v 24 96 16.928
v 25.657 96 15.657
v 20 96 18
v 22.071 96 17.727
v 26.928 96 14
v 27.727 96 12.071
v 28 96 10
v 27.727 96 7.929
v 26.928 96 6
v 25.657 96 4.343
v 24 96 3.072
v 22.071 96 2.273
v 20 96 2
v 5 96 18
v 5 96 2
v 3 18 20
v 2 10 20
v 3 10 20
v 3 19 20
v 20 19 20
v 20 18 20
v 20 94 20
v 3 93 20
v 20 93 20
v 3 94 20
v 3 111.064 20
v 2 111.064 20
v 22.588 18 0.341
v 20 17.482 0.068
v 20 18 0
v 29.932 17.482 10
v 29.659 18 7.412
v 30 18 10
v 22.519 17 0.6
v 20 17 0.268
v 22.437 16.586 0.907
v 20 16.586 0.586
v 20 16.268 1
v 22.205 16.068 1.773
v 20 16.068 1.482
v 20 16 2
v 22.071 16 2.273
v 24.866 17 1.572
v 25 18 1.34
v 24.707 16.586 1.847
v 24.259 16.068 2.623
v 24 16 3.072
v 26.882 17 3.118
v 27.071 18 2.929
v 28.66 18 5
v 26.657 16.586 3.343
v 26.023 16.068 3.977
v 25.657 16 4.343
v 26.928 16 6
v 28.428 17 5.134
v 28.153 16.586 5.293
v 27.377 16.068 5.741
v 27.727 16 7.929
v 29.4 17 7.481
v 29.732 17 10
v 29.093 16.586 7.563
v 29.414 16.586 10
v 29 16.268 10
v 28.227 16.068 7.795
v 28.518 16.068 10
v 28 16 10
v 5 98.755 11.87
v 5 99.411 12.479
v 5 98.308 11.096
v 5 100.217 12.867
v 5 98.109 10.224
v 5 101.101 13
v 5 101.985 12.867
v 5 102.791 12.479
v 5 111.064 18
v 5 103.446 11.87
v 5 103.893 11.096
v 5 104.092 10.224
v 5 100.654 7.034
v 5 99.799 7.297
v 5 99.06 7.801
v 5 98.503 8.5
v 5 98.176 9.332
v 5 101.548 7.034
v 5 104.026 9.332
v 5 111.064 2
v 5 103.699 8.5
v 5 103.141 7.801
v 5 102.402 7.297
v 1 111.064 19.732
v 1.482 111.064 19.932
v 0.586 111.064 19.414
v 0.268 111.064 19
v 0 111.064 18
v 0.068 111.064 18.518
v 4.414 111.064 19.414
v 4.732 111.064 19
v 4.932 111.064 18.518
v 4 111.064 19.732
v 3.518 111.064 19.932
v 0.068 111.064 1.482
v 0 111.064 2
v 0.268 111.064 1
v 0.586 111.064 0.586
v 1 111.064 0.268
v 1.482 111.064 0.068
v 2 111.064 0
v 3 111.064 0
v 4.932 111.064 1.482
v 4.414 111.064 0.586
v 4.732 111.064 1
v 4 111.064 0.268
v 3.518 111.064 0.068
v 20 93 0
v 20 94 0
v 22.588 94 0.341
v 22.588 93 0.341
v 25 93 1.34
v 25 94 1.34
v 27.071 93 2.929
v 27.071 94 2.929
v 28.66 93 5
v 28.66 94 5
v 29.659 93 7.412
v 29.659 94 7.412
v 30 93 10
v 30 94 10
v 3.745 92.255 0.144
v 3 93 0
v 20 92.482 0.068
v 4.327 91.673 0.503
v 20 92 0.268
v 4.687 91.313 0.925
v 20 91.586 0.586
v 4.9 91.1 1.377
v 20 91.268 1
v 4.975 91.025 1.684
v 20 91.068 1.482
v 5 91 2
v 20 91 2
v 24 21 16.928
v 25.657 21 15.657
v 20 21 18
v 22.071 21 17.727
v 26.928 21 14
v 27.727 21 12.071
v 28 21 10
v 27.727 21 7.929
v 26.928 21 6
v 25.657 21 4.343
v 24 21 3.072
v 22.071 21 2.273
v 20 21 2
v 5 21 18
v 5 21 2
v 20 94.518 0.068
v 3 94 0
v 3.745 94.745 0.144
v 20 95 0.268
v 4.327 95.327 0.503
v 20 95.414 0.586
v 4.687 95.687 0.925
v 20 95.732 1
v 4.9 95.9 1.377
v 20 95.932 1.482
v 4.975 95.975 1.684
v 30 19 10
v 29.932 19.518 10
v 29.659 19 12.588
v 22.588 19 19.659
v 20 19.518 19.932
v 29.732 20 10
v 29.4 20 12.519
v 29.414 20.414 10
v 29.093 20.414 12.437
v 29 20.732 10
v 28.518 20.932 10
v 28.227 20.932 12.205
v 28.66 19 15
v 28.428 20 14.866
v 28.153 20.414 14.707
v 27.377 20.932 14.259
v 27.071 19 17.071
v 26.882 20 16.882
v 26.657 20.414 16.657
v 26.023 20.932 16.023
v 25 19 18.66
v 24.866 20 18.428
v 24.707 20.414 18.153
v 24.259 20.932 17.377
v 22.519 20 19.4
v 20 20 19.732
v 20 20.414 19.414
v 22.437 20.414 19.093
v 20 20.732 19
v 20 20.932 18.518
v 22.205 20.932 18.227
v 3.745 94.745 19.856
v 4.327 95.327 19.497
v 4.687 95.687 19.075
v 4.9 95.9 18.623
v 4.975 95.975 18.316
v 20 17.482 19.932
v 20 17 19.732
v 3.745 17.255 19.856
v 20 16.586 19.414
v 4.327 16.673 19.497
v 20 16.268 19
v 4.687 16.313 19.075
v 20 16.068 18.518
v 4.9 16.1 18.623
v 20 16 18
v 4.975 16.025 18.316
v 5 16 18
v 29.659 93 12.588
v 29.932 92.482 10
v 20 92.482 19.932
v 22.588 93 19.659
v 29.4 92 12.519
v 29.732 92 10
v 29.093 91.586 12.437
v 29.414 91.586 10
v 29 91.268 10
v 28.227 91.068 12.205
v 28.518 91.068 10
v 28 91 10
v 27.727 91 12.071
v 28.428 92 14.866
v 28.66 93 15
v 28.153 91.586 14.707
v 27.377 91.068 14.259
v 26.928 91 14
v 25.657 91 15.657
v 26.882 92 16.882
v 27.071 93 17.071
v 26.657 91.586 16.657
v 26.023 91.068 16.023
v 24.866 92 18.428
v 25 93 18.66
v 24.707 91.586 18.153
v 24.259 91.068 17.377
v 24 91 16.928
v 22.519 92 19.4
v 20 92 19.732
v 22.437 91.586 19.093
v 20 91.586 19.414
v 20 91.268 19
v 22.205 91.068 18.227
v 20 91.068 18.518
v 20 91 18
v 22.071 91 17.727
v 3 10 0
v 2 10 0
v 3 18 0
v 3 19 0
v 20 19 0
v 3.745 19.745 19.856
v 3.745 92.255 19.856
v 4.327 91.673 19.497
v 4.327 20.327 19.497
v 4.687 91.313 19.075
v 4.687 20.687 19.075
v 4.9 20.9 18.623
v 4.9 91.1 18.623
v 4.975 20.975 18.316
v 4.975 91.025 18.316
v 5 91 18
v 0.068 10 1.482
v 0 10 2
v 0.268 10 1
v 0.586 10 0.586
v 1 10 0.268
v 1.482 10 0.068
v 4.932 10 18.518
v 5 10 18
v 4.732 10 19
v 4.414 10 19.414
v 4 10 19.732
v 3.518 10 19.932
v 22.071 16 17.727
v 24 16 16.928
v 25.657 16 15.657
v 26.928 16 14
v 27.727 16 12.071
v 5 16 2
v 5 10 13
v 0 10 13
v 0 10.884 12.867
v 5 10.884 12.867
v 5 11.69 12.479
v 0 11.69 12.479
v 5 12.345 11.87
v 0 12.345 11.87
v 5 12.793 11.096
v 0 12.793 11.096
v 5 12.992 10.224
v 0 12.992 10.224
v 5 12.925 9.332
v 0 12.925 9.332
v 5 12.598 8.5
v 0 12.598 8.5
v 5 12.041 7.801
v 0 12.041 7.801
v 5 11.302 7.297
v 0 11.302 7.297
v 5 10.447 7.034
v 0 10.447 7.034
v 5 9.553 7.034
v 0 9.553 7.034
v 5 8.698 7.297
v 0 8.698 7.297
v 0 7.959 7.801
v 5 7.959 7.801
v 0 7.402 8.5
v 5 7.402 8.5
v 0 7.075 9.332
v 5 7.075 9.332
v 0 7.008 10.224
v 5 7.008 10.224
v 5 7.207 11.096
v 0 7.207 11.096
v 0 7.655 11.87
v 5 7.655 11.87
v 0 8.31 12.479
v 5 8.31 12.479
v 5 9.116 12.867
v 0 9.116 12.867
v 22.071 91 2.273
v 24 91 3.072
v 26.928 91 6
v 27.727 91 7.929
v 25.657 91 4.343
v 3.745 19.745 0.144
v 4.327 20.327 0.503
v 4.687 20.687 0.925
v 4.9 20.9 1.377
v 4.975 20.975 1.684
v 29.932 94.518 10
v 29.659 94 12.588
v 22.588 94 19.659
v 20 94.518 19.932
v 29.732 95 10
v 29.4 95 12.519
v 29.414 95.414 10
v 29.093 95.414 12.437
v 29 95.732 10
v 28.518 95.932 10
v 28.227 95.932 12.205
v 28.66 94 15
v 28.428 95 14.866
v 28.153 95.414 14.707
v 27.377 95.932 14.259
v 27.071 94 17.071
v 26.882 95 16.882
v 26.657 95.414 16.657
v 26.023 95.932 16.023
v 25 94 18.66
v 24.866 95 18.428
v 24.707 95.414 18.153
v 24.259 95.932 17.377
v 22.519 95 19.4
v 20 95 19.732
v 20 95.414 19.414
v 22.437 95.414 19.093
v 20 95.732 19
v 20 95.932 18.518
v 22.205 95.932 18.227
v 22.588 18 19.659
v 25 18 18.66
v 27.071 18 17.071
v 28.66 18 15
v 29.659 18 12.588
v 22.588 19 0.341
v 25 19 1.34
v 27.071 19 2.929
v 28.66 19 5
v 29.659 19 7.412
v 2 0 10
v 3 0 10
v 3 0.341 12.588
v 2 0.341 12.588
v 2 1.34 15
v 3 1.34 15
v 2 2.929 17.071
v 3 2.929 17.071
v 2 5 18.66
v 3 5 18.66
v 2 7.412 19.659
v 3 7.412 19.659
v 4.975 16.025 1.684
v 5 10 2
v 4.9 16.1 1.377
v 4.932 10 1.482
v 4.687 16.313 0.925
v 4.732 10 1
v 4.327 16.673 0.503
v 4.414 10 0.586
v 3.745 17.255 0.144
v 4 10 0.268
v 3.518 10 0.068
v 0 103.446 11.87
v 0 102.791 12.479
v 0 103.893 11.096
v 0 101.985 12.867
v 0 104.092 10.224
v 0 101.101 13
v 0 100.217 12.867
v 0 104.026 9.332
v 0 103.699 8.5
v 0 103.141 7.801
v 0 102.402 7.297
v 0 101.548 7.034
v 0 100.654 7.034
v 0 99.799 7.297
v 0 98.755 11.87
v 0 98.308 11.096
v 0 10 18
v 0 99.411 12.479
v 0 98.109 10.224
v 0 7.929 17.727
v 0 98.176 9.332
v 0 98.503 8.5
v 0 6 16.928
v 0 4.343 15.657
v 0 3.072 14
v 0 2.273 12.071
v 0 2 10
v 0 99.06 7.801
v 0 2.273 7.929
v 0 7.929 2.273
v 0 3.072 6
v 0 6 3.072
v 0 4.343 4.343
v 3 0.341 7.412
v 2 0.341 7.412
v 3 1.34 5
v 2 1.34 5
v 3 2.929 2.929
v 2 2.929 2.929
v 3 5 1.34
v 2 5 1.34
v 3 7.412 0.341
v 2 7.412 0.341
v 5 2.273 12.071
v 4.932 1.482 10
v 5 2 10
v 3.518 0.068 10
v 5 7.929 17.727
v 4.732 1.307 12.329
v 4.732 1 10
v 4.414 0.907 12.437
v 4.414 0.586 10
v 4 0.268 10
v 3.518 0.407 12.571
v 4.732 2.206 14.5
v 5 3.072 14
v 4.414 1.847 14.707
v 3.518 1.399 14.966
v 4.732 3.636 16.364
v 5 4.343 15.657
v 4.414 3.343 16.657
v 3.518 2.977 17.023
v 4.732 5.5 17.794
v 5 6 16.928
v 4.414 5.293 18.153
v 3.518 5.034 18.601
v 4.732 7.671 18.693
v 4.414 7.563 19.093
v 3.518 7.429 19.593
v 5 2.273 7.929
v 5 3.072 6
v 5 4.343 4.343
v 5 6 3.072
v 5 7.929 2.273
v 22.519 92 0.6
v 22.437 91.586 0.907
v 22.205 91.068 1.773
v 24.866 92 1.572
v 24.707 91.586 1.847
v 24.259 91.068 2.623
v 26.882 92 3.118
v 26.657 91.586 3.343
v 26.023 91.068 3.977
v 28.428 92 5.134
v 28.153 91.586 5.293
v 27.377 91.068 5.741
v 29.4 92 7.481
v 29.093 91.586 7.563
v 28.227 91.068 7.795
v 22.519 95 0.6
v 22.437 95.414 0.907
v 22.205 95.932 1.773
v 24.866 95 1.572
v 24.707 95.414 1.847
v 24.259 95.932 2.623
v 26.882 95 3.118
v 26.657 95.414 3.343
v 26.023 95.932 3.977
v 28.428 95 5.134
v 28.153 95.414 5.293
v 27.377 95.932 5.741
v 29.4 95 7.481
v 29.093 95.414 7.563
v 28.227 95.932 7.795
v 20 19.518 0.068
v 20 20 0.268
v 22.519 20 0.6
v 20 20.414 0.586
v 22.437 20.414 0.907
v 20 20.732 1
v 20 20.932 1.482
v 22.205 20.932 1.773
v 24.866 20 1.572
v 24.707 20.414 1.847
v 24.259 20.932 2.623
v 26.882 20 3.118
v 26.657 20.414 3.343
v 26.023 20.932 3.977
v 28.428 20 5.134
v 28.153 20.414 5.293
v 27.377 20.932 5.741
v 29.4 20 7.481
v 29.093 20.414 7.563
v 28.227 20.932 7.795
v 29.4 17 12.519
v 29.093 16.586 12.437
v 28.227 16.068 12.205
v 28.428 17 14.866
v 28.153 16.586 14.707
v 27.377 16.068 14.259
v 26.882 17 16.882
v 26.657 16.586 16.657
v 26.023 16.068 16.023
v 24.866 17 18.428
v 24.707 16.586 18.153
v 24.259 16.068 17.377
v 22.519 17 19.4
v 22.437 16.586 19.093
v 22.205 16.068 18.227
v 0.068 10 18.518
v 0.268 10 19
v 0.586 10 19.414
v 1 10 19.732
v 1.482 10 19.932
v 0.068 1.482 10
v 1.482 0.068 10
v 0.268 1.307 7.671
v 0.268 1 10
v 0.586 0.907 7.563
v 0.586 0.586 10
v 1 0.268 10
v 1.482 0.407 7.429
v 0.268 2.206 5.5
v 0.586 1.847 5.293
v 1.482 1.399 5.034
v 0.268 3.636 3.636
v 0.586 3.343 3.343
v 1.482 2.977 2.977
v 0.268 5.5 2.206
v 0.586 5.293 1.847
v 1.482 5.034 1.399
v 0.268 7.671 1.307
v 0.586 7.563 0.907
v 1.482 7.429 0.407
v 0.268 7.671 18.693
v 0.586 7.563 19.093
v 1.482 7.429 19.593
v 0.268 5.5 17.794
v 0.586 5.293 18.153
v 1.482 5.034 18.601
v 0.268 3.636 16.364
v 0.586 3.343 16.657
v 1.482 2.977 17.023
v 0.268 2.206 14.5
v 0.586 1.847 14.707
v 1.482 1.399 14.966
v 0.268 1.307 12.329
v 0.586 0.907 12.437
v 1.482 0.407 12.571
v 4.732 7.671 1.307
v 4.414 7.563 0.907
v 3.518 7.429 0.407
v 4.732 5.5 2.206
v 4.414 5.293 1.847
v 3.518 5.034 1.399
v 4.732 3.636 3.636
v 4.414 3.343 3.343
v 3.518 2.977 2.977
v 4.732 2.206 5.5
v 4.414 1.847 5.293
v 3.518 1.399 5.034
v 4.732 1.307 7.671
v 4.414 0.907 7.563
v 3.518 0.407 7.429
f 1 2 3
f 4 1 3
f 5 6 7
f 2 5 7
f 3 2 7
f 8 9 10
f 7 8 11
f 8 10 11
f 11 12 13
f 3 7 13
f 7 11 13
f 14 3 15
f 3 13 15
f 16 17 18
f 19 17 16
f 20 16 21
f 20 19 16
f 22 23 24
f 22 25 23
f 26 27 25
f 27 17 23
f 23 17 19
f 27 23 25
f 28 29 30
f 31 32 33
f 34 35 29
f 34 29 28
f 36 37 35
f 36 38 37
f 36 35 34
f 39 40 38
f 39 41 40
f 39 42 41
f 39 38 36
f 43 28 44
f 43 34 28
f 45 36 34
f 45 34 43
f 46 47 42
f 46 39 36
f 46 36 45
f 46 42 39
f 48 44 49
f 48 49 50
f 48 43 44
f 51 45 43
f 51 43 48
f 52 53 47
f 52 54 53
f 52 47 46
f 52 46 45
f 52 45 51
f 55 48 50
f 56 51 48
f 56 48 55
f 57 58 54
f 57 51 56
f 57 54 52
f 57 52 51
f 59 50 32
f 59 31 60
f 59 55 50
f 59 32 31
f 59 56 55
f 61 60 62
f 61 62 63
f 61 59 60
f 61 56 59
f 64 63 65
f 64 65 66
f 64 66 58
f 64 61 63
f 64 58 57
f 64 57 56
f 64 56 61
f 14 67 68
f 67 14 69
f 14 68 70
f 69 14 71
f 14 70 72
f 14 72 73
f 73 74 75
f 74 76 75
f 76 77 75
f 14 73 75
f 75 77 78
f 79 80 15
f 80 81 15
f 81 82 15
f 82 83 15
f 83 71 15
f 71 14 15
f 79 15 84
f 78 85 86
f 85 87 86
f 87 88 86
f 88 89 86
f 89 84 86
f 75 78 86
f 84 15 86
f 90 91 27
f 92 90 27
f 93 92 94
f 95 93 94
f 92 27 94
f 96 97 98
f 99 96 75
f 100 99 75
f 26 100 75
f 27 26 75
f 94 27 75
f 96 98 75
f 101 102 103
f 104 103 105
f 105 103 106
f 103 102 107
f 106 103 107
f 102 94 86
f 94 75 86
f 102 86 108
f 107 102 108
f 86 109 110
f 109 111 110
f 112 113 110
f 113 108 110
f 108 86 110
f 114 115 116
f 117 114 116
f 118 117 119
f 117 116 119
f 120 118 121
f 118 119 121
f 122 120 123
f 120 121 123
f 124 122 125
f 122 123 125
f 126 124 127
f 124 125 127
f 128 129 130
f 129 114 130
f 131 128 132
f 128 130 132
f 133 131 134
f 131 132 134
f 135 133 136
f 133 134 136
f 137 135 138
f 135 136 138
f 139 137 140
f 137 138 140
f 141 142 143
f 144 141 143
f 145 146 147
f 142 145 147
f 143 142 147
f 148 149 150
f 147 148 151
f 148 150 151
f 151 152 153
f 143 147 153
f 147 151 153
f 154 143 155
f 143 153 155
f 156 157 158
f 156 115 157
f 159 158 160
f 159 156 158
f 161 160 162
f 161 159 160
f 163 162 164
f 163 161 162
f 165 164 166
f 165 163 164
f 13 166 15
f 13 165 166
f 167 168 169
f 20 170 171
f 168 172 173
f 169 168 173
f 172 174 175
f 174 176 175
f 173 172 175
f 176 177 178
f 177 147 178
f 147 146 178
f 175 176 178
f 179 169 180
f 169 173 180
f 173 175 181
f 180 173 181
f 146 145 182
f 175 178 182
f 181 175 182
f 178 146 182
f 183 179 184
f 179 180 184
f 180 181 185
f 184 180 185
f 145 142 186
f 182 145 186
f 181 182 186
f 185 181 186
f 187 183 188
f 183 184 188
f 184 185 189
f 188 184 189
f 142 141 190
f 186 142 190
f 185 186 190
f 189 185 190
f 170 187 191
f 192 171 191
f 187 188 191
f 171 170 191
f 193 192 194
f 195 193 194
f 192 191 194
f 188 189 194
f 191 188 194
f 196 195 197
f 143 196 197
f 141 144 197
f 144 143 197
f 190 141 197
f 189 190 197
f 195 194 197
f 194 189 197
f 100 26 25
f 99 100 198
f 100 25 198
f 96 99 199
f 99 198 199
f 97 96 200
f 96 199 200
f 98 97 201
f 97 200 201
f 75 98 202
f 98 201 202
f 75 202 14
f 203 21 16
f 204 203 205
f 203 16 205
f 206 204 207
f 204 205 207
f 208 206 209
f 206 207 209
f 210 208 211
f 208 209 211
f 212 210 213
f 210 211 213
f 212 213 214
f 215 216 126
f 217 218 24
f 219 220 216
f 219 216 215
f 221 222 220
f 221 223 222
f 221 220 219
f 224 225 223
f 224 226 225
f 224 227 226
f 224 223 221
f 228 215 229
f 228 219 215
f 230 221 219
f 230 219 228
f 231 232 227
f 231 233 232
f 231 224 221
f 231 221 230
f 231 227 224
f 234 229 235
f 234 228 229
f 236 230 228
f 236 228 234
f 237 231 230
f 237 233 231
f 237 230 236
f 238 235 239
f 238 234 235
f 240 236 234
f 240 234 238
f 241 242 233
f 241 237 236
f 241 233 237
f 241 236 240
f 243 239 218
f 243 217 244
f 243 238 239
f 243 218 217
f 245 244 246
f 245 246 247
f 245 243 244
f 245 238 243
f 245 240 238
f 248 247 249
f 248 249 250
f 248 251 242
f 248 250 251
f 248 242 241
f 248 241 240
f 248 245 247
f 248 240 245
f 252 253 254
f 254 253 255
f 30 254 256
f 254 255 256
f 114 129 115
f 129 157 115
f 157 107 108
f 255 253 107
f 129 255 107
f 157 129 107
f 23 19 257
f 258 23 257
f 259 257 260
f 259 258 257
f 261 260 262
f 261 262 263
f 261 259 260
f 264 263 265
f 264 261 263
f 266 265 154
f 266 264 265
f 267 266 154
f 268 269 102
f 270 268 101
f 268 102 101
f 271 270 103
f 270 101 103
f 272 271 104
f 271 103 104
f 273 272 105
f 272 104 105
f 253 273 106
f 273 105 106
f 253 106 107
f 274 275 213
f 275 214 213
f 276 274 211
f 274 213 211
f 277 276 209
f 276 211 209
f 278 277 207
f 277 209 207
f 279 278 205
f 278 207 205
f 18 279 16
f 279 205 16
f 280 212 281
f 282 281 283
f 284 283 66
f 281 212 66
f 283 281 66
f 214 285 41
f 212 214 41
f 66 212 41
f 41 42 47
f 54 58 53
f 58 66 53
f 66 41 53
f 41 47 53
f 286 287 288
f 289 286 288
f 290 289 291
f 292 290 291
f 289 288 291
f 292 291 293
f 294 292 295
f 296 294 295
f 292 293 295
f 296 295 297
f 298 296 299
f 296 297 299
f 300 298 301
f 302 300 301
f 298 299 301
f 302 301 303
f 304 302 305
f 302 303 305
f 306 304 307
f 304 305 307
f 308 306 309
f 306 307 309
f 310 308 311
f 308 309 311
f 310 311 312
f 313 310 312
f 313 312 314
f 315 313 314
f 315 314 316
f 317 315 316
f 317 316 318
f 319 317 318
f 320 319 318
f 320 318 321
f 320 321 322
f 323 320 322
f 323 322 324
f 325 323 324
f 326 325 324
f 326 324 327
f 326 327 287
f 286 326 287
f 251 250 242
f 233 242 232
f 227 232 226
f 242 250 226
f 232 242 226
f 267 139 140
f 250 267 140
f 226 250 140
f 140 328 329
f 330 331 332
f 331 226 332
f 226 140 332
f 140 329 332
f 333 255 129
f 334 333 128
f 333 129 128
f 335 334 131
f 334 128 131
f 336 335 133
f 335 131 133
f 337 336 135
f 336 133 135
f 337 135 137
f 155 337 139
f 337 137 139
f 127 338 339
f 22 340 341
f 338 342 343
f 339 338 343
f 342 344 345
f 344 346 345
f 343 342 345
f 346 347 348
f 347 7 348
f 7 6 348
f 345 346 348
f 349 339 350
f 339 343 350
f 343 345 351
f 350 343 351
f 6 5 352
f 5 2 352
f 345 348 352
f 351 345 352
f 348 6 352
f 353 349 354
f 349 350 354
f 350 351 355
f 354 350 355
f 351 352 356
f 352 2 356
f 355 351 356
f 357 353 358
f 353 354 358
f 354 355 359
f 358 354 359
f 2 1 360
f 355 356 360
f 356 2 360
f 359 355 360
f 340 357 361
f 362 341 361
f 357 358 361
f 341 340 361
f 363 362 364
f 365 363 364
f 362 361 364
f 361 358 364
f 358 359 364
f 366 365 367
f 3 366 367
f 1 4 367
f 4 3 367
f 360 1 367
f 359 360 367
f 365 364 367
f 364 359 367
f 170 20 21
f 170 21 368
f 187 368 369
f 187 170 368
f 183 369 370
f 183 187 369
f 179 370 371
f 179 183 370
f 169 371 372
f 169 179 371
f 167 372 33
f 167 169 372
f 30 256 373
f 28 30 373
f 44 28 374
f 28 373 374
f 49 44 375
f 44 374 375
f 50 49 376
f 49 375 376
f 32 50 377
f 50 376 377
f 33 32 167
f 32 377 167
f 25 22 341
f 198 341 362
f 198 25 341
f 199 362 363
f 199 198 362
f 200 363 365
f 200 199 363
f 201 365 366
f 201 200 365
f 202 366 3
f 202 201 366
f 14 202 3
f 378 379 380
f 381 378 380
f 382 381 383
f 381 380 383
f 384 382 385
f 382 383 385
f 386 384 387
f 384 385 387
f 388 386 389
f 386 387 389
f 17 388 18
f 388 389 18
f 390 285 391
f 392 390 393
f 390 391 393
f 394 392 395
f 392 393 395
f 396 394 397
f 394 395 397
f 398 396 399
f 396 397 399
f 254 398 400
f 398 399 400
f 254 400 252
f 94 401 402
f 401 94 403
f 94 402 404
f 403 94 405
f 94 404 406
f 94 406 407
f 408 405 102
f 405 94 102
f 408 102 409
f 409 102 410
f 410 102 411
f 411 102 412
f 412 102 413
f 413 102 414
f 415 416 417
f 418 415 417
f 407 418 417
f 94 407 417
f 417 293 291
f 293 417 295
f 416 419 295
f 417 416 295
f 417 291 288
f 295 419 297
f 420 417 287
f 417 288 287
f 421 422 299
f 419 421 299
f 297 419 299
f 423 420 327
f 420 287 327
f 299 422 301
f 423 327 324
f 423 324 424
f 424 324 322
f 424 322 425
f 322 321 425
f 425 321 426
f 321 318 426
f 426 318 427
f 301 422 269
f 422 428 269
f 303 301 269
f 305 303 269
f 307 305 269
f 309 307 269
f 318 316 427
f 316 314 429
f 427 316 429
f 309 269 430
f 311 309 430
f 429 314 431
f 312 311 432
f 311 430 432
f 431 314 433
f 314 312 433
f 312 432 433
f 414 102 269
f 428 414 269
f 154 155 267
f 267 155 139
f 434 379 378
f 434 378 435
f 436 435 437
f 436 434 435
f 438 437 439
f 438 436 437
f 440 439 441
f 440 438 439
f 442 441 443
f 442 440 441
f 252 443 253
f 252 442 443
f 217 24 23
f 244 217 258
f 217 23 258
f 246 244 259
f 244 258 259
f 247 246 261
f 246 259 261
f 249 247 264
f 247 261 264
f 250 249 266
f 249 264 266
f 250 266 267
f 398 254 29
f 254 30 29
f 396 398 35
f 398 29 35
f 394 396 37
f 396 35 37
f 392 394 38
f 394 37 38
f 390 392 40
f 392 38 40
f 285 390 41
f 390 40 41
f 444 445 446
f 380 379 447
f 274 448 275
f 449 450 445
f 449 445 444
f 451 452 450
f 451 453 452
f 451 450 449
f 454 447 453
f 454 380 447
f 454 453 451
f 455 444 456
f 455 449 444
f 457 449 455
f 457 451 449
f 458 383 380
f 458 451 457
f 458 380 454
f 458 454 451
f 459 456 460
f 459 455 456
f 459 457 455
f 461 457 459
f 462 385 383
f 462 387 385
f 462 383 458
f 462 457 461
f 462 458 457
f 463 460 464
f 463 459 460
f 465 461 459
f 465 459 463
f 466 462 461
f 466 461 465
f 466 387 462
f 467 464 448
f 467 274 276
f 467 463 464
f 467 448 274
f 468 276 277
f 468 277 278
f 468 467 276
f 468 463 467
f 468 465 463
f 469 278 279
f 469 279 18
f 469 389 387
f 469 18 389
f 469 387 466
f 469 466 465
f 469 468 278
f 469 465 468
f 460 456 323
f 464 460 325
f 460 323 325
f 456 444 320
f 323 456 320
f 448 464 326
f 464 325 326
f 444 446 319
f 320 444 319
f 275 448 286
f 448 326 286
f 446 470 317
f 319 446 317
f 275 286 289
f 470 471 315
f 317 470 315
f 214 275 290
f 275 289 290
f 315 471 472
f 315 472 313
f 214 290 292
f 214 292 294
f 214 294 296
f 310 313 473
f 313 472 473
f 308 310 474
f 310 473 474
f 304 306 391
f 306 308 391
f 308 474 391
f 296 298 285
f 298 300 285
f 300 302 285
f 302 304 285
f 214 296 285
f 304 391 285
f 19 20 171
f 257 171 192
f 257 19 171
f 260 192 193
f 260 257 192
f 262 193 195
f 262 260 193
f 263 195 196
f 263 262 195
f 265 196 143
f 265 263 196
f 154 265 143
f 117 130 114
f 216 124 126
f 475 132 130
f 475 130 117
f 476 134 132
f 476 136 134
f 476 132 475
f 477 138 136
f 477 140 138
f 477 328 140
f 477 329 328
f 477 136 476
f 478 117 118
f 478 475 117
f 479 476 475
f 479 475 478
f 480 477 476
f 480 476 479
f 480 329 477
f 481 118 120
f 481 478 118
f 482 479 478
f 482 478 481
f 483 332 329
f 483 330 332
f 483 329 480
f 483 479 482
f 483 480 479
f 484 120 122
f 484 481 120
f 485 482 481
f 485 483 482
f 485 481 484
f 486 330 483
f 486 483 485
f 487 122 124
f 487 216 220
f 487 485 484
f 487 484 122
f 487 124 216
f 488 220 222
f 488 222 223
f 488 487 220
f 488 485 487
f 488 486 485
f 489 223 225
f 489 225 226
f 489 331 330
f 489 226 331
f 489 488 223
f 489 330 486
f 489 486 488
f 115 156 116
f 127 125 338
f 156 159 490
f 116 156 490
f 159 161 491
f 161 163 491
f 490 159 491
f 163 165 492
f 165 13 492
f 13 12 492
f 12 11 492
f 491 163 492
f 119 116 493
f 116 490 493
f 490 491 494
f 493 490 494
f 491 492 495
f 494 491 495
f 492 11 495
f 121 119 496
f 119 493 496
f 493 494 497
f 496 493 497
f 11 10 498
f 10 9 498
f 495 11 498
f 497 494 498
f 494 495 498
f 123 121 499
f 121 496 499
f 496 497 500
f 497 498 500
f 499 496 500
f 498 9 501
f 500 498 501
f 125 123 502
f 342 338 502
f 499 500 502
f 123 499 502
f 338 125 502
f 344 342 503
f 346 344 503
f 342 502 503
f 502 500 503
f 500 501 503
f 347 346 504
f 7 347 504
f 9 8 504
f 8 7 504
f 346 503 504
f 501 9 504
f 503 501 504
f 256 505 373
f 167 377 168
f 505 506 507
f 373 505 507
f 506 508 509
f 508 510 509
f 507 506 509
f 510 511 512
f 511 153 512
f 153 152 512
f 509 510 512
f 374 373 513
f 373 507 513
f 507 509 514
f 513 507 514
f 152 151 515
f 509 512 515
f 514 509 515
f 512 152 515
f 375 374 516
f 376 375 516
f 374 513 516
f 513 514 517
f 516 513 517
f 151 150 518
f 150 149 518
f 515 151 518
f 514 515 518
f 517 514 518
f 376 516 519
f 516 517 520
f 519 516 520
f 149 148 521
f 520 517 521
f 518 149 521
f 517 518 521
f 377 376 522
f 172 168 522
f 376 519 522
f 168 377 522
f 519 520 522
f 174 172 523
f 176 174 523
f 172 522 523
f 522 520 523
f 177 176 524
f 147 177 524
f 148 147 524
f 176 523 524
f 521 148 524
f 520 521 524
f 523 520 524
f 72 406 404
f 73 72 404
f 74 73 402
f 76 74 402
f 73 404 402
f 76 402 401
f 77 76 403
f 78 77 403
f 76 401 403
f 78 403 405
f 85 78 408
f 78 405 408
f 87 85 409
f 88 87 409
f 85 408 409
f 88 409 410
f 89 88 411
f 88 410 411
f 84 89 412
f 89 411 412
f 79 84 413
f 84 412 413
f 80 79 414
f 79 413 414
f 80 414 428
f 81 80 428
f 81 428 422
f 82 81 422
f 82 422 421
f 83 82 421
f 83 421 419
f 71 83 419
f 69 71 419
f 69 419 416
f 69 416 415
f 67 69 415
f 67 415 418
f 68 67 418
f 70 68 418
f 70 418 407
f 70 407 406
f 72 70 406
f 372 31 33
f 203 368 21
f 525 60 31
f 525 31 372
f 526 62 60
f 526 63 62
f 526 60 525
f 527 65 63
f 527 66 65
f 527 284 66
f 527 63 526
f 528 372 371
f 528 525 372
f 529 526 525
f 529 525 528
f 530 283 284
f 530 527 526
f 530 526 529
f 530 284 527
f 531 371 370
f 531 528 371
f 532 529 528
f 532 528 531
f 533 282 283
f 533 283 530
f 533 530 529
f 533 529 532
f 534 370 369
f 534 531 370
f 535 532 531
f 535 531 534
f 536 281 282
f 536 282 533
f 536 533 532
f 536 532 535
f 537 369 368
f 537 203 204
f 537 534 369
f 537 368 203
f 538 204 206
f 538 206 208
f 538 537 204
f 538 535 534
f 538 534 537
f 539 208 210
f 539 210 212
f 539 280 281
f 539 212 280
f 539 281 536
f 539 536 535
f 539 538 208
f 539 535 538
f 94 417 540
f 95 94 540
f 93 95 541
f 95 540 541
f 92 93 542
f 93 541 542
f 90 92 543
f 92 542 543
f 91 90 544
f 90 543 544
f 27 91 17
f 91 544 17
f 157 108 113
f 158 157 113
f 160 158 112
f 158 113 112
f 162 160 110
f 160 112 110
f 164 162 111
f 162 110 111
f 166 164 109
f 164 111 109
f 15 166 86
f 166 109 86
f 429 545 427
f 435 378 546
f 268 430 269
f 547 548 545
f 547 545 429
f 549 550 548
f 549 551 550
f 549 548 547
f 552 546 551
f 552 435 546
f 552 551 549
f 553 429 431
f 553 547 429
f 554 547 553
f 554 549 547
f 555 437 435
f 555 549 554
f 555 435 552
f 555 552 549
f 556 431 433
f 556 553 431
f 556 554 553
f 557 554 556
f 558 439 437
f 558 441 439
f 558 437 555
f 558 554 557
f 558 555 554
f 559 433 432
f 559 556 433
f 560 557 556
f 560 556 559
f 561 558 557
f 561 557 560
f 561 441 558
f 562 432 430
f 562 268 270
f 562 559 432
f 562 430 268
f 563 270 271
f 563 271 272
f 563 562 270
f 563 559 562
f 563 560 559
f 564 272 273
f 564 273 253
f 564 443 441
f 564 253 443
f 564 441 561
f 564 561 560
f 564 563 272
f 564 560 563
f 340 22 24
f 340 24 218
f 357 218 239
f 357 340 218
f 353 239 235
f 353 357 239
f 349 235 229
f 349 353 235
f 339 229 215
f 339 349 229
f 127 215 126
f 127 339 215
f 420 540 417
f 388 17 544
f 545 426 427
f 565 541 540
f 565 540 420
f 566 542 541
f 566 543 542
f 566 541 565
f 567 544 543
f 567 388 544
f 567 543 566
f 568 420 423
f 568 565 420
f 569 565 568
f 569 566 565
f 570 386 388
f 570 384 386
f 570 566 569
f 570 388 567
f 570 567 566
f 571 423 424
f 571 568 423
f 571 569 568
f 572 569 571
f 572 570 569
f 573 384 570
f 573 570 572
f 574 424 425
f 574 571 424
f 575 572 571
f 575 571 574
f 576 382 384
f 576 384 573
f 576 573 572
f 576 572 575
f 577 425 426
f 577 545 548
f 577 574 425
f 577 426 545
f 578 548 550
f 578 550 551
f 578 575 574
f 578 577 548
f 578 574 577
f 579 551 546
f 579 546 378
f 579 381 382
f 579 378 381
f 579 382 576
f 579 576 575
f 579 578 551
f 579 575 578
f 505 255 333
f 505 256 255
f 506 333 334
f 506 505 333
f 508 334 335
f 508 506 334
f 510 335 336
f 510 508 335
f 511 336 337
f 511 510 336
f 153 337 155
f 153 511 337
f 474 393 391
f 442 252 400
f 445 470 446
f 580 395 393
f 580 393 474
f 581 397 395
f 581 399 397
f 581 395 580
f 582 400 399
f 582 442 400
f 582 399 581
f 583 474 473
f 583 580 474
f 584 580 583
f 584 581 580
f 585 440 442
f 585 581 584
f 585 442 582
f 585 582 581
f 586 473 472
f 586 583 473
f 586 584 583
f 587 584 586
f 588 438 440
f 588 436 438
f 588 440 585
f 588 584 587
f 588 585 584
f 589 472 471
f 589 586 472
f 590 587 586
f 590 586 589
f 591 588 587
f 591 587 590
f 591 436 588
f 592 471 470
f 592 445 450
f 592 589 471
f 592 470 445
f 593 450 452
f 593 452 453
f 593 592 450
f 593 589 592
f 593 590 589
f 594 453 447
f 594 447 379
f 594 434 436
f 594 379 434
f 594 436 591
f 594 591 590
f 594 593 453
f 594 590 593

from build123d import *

# Parameters (mm, degrees)
BOSS_EXTRUDE1_DEPTH = 20
SKETCH2_R           = 3
CUT_EXTRUDE1_DEPTH  = 20
FILLET1_R           = 10
FILLET2_R           = 2
CUT_EXTRUDE2_DEPTH  = 10


with BuildPart() as part:
    # Sketch1 → Boss-Extrude1 (new body)
    with BuildSketch(Plane.XY):
        Polygon((0, 0), (5, 0), (5, 10), (5, 16), (30, 16), (30, 21), (5, 21), (5, 91), (30, 91), (30, 96), (5, 96), (5, 170), (0, 170), align=None)
    extrude(amount=BOSS_EXTRUDE1_DEPTH)

    # Sketch2 → Cut-Extrude1 (cut)
    with BuildSketch(Plane.ZY):
        with Locations((10, 10)):
            Circle(SKETCH2_R)
        with Locations((10, 101.100788163)):
            Circle(SKETCH2_R)
    extrude(amount=-CUT_EXTRUDE1_DEPTH, mode=Mode.SUBTRACT)

    # Fillet1
    fillet1_edges = [part.edges().sort_by_distance(p)[0] for p in [
        (2.5, 170, 20),
        (2.5, 170, 0),
        (2.5, 0, 0),
        (2.5, 0, 20),
        (30, 18.5, 20),
        (30, 18.5, 0),
        (30, 93.5, 0),
        (30, 93.5, 20),
    ]]
    fillet(fillet1_edges, radius=FILLET1_R - 0.0001)  # a hair under: the kernel refuses the full size

    # Fillet2
    fillet2_edges = [part.edges().sort_by_distance(p)[0] for p in [
        (5, 56, 0),
        (12.50005, 16, 0),
        (12.50005, 96, 20),
        (5, 128.00005, 0),
        (12.50005, 96, 0),
        (12.50005, 91, 0),
        (5, 128.00005, 20),
        (12.50005, 16, 20),
        (5, 167.071097101, 2.928902899),
        (5, 167.071097101, 17.071097101),
        (0, 85, 20),
        (5, 12.99995, 20),
        (12.50005, 21, 20),
        (0, 85, 0),
        (0, 2.928902899, 17.071097101),
        (0, 2.928902899, 2.928902899),
        (0, 167.071097101, 2.928902899),
        (0, 167.071097101, 17.071097101),
        (12.50005, 91, 20),
        (12.50005, 21, 0),
        (5, 12.99995, 0),
        (5, 2.928902899, 17.071097101),
        (5, 56, 20),
        (5, 2.928902899, 2.928902899),
        (27.071097101, 21, 2.928902899),
        (27.071097101, 21, 17.071097101),
        (27.071097101, 16, 2.928902899),
        (27.071097101, 16, 17.071097101),
        (27.071097101, 96, 17.071097101),
        (27.071097101, 96, 2.928902899),
        (27.071097101, 91, 17.071097101),
        (27.071097101, 91, 2.928902899),
    ]]
    fillet(fillet2_edges, radius=FILLET2_R)

    # Sketch3 → Cut-Extrude2 (cut)
    with BuildSketch(Plane(origin=(5, 0, 0), x_dir=(0, 0, -1), z_dir=(1, 0, 0))):
        with BuildLine():
            Line((-2, 111.064309568), (0, 111.064309568))
            Line((0, 111.064309568), (5.411818178, 111.064309568))
            Line((5.411818178, 111.064309568), (5.411818178, 180.556551252))
            Line((5.411818178, 180.556551252), (-29.02399195, 180.556551252))
            Line((-29.02399195, 180.556551252), (-29.02399195, 111.064309568))
            Line((-29.02399195, 111.064309568), (-20, 111.064309568))
            Line((-20, 111.064309568), (-18, 111.064309568))
            Line((-18, 111.064309568), (-18, 160))
            ThreePointArc((-18, 160), (-15.656854249, 165.656854249), (-10, 168))
            ThreePointArc((-10, 168), (-4.343145751, 165.656854249), (-2, 160))
            Line((-2, 160), (-2, 111.064309568))
        make_face()
        with BuildLine():
            Line((-18, 111.064309568), (-2, 111.064309568))
            Line((-2, 111.064309568), (-2, 160))
            ThreePointArc((-2, 160), (-4.343145751, 165.656854249), (-10, 168))
            ThreePointArc((-10, 168), (-15.656854249, 165.656854249), (-18, 160))
            Line((-18, 160), (-18, 111.064309568))
        make_face()
    extrude(amount=-CUT_EXTRUDE2_DEPTH, mode=Mode.SUBTRACT)


solid = part.part
